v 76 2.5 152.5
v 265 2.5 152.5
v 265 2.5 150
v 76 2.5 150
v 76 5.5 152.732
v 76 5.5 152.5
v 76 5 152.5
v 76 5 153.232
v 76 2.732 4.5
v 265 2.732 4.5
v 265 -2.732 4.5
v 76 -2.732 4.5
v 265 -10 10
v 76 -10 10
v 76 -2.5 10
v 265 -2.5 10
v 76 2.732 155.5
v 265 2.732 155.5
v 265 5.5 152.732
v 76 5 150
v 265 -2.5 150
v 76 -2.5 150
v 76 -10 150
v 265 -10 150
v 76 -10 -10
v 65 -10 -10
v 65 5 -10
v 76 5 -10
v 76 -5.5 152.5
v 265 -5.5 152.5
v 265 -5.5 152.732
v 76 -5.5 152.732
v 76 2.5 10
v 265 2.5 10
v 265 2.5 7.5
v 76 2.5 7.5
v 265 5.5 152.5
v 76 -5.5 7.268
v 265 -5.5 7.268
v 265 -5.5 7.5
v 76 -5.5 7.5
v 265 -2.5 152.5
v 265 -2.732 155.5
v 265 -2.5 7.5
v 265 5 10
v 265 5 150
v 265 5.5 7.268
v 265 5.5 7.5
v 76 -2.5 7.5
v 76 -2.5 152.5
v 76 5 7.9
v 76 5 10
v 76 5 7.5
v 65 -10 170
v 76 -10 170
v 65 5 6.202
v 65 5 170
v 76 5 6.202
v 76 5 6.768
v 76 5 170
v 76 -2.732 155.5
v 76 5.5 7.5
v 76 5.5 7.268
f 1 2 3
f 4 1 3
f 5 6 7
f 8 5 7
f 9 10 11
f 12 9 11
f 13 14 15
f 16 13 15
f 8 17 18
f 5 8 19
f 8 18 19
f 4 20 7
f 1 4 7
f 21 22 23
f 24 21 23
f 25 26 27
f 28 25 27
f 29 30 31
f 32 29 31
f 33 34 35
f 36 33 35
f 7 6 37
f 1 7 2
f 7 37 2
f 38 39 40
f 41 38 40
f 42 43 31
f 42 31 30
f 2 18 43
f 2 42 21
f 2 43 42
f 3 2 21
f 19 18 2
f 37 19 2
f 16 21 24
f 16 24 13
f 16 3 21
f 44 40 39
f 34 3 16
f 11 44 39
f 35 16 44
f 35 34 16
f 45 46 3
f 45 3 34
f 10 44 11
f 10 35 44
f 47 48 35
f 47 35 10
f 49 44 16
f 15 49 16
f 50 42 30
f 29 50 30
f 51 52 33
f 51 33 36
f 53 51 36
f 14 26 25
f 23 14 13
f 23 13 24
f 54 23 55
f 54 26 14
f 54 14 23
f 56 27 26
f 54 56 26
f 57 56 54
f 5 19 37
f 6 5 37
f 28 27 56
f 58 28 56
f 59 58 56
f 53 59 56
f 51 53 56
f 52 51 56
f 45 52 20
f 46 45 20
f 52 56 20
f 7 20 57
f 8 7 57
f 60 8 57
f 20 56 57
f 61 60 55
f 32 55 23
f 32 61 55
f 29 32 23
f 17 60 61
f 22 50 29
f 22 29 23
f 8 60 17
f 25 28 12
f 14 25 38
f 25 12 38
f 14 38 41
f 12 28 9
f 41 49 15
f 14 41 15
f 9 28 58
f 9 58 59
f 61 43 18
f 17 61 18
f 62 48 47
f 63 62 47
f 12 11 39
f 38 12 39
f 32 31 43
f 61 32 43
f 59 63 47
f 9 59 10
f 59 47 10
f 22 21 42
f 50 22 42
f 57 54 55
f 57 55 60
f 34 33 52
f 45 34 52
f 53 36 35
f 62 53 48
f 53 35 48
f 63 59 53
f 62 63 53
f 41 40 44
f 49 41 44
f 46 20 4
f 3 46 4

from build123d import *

# Parameters (mm, degrees)
SKETCH1_R           = 2.1
BOSS_EXTRUDE1_DEPTH = 65
BOSS_EXTRUDE6_DEPTH = 200
SKETCH85_W          = 34.906324044
SKETCH85_H          = 40.252337635
CUT_EXTRUDE59_DEPTH = 65
SKETCH87_W          = 20
SKETCH87_H          = 15
BOSS_EXTRUDE7_DEPTH = 11
SKETCH88_W          = 1.985779144
SKETCH88_H          = 1.348664344
SKETCH88_W_2        = 1.884447459
SKETCH88_H_2        = 1.174834559
CUT_EXTRUDE60_DEPTH = 11
CUT_EXTRUDE61_DEPTH = 189


with BuildPart() as part:
    # Sketch1 → Boss-Extrude1 (new body)
    with BuildSketch(Plane(origin=(0, 0, 0), x_dir=(0, 0, -1), z_dir=(1, 0, 0))):
        with BuildLine():
            Line((-10, 9), (-10, 3))
            Line((-10, 3), (-8, 3))
            Line((-8, 3), (-8, 6))
            Line((-8, 6), (-7.060660172, 6))
            Line((-7.060660172, 6), (-4, 2.939339828))
            Line((-4, 2.939339828), (-4, -2.939339828))
            Line((-4, -2.939339828), (-7.060660172, -6))
            Line((-7.060660172, -6), (-8, -6))
            Line((-8, -6), (-8, -3))
            Line((-8, -3), (-10, -3))
            Line((-10, -3), (-10, -9))
            ThreePointArc((-10, -9), (-9.707106781, -9.707106781), (-9, -10))
            Line((-9, -10), (-3, -10))
            Line((-3, -10), (-3, -8))
            Line((-3, -8), (-6, -8))
            Line((-6, -8), (-6, -7.060660172))
            Line((-6, -7.060660172), (-2.939339828, -4))
            Line((-2.939339828, -4), (2.939339828, -4))
            Line((2.939339828, -4), (6, -7.060660172))
            Line((6, -7.060660172), (6, -8))
            Line((6, -8), (3, -8))
            Line((3, -8), (3, -10))
            Line((3, -10), (9, -10))
            ThreePointArc((9, -10), (9.707106781, -9.707106781), (10, -9))
            Line((10, -9), (10, -3))
            Line((10, -3), (8, -3))
            Line((8, -3), (8, -6))
            Line((8, -6), (7.060660172, -6))
            Line((7.060660172, -6), (4, -2.939339828))
            Line((4, -2.939339828), (4, 2.939339828))
            Line((4, 2.939339828), (7.060660172, 6))
            Line((7.060660172, 6), (8, 6))
            Line((8, 6), (8, 3))
            Line((8, 3), (10, 3))
            Line((10, 3), (10, 9))
            ThreePointArc((10, 9), (9.707106781, 9.707106781), (9, 10))
            Line((9, 10), (3, 10))
            Line((3, 10), (3, 8))
            Line((3, 8), (6, 8))
            Line((6, 8), (6, 7.060660172))
            Line((6, 7.060660172), (2.939339828, 4))
            Line((2.939339828, 4), (-2.939339828, 4))
            Line((-2.939339828, 4), (-6, 7.060660172))
            Line((-6, 7.060660172), (-6, 8))
            Line((-6, 8), (-3, 8))
            Line((-3, 8), (-3, 10))
            Line((-3, 10), (-9, 10))
            ThreePointArc((-9, 10), (-9.707106781, 9.707106781), (-10, 9))
        make_face()
        Circle(SKETCH1_R, mode=Mode.SUBTRACT)
    extrude(amount=BOSS_EXTRUDE1_DEPTH)

    # Sketch85 → Cut-Extrude59 (cut)
    with BuildSketch(Plane.ZY):
        with Locations((-1.630437185, 0.066948306)):
            Rectangle(SKETCH85_W, SKETCH85_H)
    extrude(amount=-CUT_EXTRUDE59_DEPTH, mode=Mode.SUBTRACT)


with BuildPart() as body_2:
    # Sketch84 → Boss-Extrude6 (new body)
    with BuildSketch(Plane(origin=(65, 0, 0), x_dir=(0, 0, -1), z_dir=(1, 0, 0))):
        Polygon((-150, -2.9), (-150, 2.9), (-152.1, 2.9), (-152.1, 5.9), (-152.897918472, 5.9), (-155.9, 2.897918472), (-155.9, -2.897918472), (-152.897918472, -5.9), (-152.1, -5.9), (-152.1, -2.9), align=None)
        Polygon((-80, -10), (-80, 5), (-150, 5), (-150, 3), (-150, 2.9), (-150, -2.9), (-150, -3), (-150, -10), align=None)
        Polygon((-10, 2.9), (-10, 3), (-10, 5), (-80, 5), (-80, -10), (-10, -10), (-10, -9), (-10, -3), (-10, -2.9), (-7.9, -2.9), (-7.9, -5.9), (-7.102081528, -5.9), (-4.1, -2.897918472), (-4.1, 2.897918472), (-7.102081528, 5.9), (-7.9, 5.9), (-7.9, 2.9), align=None)
    extrude(amount=BOSS_EXTRUDE6_DEPTH)

    # Sketch87 → Boss-Extrude7 (add)
    with BuildSketch(Plane.ZY.offset(-65)):
        with Locations((160, -2.5)):
            Rectangle(SKETCH87_W, SKETCH87_H)
        with Locations((0, -2.5)):
            Rectangle(SKETCH87_W, SKETCH87_H)
    extrude(amount=-BOSS_EXTRUDE7_DEPTH)

    # Sketch88 → Cut-Extrude60 (cut)
    with BuildSketch(Plane.ZY.offset(-65)):
        with Locations((153.092889572, 5.674332172)):
            Rectangle(SKETCH88_W, SKETCH88_H)
        with Locations((6.957776271, 5.58741728)):
            Rectangle(SKETCH88_W_2, SKETCH88_H_2)
    extrude(amount=-CUT_EXTRUDE60_DEPTH, mode=Mode.SUBTRACT)

    # Sketch89 → Cut-Extrude61 (cut)
    with BuildSketch(Plane(origin=(265, 0, 0), x_dir=(0, 0, -1), z_dir=(1, 0, 0))):
        Polygon((-7.9, 2.9), (-10, 2.9), (-10, 2.5), (-9.6, 2.5), (-7.5, 2.5), (-7.5, 5.5), (-7.267766953, 5.5), (-4.5, 2.732233047), (-4.5, -2.732233047), (-7.267766953, -5.5), (-7.5, -5.5), (-7.5, -2.5), (-9.6, -2.5), (-10, -2.5), (-10, -2.9), (-7.9, -2.9), (-7.9, -5.9), (-7.102081528, -5.9), (-4.1, -2.897918472), (-4.1, 2.897918472), (-7.102081528, 5.9), (-7.9, 5.9), align=None)
        Polygon((-150, 2.5), (-150, 2.9), (-152.1, 2.9), (-152.1, 5.9), (-152.897918472, 5.9), (-155.9, 2.897918472), (-155.9, -2.897918472), (-152.897918472, -5.9), (-152.1, -5.9), (-152.1, -2.9), (-150, -2.9), (-150, -2.5), (-150.4, -2.5), (-152.5, -2.5), (-152.5, -5.5), (-152.732233047, -5.5), (-155.5, -2.732233047), (-155.5, 2.732233047), (-152.732233047, 5.5), (-152.5, 5.5), (-152.5, 2.5), (-150.4, 2.5), align=None)
    extrude(amount=-CUT_EXTRUDE61_DEPTH, mode=Mode.SUBTRACT)


solid = body_2.part
